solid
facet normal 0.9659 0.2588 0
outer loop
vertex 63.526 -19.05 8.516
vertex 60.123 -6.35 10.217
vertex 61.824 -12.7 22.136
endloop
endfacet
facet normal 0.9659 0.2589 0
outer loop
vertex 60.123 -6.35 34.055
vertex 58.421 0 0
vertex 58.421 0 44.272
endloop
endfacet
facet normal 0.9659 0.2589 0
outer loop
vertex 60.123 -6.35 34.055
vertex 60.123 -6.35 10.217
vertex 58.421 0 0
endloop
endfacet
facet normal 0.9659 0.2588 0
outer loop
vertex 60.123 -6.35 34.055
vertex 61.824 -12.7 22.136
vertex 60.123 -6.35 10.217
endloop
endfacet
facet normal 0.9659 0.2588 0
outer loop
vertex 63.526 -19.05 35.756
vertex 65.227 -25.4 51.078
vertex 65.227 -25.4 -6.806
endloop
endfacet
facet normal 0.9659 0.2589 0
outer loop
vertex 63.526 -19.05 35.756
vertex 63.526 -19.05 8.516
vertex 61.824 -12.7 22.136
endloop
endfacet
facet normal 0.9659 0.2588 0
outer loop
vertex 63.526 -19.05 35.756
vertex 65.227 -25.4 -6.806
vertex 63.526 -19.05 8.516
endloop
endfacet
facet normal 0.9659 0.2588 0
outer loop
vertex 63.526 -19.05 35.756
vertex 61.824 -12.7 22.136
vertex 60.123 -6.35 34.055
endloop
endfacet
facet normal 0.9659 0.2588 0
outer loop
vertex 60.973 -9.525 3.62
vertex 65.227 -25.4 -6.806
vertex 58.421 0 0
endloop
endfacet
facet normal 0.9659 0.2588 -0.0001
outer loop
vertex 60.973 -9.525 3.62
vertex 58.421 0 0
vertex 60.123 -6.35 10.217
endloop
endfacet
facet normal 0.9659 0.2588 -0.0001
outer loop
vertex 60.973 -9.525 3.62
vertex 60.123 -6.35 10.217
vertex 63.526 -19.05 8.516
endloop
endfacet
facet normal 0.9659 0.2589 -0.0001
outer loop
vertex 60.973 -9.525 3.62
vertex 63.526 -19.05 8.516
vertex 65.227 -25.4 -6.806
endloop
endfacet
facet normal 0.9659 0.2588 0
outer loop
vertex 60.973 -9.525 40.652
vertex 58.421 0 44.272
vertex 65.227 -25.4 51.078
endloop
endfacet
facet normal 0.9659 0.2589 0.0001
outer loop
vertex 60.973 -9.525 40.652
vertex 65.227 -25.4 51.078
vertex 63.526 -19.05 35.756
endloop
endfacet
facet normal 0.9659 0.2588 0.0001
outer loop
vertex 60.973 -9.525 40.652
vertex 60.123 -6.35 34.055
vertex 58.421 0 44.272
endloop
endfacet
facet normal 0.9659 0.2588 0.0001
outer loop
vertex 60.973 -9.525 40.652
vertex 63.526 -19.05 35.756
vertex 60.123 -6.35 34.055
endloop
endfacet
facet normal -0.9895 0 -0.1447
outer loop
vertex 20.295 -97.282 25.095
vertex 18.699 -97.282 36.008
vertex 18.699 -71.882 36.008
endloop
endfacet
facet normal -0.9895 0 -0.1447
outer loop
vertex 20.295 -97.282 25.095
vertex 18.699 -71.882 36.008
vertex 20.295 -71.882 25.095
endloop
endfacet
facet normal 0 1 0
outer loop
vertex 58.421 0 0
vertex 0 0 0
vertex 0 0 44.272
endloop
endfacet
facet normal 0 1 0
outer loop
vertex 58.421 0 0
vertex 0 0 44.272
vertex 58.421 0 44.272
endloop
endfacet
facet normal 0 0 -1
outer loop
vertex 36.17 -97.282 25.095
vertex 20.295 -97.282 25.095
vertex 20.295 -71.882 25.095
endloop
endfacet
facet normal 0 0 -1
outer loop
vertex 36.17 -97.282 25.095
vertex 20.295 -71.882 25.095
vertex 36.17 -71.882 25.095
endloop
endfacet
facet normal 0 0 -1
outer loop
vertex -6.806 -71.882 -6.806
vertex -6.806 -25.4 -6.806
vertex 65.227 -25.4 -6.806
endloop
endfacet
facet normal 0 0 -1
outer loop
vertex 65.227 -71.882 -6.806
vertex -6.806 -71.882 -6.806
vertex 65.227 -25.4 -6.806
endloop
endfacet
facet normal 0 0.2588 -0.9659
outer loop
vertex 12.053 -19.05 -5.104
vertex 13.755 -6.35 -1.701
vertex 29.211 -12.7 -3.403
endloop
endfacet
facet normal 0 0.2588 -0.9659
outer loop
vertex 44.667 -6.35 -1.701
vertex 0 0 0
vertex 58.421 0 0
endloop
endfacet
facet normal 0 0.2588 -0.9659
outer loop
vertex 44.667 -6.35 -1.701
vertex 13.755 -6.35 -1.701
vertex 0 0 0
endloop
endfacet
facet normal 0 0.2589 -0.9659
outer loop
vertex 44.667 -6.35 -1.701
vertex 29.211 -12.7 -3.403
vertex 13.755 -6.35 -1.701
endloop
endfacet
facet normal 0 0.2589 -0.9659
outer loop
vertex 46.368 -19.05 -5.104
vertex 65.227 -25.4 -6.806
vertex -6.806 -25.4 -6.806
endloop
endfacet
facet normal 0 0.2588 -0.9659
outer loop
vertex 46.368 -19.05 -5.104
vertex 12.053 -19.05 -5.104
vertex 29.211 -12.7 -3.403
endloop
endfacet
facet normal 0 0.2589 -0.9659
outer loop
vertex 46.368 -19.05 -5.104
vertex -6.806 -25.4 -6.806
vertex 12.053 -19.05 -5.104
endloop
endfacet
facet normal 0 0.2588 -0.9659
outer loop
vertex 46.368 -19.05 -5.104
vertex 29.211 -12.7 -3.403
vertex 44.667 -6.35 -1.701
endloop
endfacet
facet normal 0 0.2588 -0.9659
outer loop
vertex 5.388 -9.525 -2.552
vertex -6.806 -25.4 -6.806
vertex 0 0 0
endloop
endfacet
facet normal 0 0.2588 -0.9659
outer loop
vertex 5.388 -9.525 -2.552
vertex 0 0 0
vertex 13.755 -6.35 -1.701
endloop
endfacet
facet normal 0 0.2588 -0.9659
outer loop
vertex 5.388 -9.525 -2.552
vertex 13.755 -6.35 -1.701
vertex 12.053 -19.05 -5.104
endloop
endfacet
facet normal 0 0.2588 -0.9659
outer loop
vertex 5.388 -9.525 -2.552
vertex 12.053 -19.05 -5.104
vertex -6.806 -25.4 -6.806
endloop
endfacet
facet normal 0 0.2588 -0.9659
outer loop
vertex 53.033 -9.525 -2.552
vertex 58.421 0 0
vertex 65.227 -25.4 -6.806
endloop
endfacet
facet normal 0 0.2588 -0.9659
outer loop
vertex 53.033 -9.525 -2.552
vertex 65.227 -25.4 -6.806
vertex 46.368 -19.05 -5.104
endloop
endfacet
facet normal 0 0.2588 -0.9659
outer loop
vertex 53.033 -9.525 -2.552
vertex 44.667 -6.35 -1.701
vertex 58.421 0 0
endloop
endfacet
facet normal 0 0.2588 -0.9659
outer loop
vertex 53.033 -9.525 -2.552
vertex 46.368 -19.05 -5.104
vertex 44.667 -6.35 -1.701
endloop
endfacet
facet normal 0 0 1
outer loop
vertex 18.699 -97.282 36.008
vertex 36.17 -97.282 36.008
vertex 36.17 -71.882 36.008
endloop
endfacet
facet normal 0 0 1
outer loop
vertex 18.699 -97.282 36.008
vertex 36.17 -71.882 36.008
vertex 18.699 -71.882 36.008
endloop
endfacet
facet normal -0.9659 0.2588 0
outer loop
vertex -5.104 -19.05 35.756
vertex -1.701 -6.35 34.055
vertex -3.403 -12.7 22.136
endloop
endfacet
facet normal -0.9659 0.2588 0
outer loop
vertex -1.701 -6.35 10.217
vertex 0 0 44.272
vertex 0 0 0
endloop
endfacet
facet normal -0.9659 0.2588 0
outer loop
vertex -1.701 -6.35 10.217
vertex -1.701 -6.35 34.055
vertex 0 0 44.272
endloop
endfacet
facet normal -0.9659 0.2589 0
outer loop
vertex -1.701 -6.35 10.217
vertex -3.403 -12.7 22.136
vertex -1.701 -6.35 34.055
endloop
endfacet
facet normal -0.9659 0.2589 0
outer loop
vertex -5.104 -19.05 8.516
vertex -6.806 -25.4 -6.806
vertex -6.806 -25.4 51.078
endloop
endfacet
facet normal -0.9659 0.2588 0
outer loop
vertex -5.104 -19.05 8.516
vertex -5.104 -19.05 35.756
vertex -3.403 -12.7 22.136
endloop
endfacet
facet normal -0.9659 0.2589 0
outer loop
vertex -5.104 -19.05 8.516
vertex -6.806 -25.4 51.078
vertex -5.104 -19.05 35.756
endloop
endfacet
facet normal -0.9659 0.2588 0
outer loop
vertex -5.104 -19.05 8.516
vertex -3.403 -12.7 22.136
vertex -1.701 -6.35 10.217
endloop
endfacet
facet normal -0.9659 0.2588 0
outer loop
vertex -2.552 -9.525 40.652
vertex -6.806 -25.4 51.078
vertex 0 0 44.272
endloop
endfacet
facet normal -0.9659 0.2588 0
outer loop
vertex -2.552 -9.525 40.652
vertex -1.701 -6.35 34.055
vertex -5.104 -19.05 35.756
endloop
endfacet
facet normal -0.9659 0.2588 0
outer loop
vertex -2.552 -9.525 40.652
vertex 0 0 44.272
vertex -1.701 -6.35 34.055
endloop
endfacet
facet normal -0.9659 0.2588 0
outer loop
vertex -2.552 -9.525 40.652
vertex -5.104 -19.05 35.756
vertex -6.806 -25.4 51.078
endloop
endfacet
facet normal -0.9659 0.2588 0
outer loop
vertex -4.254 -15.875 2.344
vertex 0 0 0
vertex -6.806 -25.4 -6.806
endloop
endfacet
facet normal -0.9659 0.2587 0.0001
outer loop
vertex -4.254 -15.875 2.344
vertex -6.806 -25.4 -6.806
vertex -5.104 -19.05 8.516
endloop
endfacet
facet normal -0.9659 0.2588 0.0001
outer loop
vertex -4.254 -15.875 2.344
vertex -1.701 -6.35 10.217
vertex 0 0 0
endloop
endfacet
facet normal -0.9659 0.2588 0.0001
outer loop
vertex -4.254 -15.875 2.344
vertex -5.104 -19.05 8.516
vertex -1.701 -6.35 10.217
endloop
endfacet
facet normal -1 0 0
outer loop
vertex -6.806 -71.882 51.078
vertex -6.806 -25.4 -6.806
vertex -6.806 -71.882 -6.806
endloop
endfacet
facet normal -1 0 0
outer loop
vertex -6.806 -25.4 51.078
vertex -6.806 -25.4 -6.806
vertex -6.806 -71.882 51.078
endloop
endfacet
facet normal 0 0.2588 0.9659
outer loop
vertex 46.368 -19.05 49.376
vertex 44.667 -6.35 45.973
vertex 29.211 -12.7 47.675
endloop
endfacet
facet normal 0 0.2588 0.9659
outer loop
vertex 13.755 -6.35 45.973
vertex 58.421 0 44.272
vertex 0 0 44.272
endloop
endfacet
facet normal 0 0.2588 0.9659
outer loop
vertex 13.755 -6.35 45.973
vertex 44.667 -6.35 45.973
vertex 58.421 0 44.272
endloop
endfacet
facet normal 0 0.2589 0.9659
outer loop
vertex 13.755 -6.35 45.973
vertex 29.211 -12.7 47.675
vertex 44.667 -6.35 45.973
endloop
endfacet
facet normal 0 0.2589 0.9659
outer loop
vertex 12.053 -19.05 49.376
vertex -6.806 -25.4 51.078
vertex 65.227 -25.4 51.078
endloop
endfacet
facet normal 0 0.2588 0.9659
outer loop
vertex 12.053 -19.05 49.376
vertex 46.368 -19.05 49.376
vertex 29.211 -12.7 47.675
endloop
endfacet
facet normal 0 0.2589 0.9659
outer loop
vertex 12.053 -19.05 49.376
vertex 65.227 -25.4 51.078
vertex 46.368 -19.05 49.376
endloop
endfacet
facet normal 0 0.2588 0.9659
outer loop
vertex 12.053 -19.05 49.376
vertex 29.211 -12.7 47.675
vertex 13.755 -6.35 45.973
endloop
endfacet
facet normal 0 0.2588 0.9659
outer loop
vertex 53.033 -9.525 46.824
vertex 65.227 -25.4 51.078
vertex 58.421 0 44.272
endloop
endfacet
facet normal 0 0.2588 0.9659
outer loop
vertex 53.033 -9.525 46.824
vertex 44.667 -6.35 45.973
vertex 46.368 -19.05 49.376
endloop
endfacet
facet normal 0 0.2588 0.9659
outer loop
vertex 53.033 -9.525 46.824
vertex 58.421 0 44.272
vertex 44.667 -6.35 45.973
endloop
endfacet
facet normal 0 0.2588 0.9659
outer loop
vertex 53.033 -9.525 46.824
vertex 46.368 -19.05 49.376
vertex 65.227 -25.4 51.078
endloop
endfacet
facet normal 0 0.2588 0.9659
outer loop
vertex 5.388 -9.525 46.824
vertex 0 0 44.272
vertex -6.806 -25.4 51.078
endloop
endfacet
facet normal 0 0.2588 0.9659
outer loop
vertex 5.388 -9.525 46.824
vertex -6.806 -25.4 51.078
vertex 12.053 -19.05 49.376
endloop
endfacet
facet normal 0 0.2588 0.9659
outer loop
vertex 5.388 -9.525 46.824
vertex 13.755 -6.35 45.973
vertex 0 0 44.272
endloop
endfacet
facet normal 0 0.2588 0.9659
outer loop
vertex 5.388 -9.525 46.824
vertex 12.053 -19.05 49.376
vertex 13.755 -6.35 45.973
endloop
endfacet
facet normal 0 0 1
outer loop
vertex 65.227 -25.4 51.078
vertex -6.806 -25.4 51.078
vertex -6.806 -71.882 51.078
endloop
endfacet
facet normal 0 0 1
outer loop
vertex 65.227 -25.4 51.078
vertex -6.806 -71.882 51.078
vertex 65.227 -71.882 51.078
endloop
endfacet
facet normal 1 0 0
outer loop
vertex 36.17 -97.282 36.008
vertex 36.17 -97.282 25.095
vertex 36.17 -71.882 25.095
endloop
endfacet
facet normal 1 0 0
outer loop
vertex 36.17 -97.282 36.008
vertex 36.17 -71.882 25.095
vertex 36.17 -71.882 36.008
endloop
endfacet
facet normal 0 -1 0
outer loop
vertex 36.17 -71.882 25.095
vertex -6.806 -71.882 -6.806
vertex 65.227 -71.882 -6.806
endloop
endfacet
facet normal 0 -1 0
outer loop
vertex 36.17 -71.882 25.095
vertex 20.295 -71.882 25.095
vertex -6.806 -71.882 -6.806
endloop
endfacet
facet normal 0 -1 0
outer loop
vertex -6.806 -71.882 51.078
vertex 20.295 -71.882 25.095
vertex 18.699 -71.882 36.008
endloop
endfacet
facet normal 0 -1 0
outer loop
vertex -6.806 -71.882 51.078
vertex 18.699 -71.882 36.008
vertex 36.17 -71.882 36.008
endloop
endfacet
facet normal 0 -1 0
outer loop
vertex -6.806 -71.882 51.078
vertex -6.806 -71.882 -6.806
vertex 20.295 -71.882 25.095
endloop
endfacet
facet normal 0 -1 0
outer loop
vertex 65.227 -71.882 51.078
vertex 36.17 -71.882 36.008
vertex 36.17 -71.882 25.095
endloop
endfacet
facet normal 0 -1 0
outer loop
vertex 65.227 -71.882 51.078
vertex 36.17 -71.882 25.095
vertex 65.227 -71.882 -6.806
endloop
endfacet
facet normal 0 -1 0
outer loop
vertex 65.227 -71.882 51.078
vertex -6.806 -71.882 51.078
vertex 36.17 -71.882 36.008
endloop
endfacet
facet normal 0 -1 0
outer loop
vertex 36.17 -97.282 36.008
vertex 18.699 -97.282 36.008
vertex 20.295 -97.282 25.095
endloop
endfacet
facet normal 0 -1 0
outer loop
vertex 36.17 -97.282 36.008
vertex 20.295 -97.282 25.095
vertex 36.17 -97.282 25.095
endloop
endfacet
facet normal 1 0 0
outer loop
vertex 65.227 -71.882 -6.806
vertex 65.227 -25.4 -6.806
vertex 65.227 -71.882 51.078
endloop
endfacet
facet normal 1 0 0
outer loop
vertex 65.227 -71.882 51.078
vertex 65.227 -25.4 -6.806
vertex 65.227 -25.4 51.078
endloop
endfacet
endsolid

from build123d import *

# Parameters (mm, degrees)
F0_W     = 58.4211573005
F0_H     = 44.2717149854
F1_DEPTH = 25.4
F1_TAPER = -15
F2_DEPTH = 46.482
F4_DEPTH = 25.4


with BuildPart() as f1:
    # F0 (on Front) → F1 (new body)
    with BuildSketch(Plane.XZ):
        with Locations((29.2105786502, 22.1358574927)):
            Rectangle(F0_W, F0_H)
    extrude(amount=F1_DEPTH, taper=F1_TAPER)

    # F2 (add): a face of the model
    f2_faces = [f1.faces().sort_by_distance(p)[0] for p in [
        (29.2105786502, -25.4, 22.1358574927),
    ]]
    extrude(f2_faces, amount=F2_DEPTH)

    # F3 (on face) → F4 (join)
    with BuildSketch(Plane.XZ.offset(71.882)):
        Polygon((18.6991244555, 36.0079780221), (20.2949475497, 25.0953584909), (36.1699461937, 25.0953584909), (36.1699461937, 36.0079780221), align=None)
    extrude(amount=F4_DEPTH)


solid = f1.part
